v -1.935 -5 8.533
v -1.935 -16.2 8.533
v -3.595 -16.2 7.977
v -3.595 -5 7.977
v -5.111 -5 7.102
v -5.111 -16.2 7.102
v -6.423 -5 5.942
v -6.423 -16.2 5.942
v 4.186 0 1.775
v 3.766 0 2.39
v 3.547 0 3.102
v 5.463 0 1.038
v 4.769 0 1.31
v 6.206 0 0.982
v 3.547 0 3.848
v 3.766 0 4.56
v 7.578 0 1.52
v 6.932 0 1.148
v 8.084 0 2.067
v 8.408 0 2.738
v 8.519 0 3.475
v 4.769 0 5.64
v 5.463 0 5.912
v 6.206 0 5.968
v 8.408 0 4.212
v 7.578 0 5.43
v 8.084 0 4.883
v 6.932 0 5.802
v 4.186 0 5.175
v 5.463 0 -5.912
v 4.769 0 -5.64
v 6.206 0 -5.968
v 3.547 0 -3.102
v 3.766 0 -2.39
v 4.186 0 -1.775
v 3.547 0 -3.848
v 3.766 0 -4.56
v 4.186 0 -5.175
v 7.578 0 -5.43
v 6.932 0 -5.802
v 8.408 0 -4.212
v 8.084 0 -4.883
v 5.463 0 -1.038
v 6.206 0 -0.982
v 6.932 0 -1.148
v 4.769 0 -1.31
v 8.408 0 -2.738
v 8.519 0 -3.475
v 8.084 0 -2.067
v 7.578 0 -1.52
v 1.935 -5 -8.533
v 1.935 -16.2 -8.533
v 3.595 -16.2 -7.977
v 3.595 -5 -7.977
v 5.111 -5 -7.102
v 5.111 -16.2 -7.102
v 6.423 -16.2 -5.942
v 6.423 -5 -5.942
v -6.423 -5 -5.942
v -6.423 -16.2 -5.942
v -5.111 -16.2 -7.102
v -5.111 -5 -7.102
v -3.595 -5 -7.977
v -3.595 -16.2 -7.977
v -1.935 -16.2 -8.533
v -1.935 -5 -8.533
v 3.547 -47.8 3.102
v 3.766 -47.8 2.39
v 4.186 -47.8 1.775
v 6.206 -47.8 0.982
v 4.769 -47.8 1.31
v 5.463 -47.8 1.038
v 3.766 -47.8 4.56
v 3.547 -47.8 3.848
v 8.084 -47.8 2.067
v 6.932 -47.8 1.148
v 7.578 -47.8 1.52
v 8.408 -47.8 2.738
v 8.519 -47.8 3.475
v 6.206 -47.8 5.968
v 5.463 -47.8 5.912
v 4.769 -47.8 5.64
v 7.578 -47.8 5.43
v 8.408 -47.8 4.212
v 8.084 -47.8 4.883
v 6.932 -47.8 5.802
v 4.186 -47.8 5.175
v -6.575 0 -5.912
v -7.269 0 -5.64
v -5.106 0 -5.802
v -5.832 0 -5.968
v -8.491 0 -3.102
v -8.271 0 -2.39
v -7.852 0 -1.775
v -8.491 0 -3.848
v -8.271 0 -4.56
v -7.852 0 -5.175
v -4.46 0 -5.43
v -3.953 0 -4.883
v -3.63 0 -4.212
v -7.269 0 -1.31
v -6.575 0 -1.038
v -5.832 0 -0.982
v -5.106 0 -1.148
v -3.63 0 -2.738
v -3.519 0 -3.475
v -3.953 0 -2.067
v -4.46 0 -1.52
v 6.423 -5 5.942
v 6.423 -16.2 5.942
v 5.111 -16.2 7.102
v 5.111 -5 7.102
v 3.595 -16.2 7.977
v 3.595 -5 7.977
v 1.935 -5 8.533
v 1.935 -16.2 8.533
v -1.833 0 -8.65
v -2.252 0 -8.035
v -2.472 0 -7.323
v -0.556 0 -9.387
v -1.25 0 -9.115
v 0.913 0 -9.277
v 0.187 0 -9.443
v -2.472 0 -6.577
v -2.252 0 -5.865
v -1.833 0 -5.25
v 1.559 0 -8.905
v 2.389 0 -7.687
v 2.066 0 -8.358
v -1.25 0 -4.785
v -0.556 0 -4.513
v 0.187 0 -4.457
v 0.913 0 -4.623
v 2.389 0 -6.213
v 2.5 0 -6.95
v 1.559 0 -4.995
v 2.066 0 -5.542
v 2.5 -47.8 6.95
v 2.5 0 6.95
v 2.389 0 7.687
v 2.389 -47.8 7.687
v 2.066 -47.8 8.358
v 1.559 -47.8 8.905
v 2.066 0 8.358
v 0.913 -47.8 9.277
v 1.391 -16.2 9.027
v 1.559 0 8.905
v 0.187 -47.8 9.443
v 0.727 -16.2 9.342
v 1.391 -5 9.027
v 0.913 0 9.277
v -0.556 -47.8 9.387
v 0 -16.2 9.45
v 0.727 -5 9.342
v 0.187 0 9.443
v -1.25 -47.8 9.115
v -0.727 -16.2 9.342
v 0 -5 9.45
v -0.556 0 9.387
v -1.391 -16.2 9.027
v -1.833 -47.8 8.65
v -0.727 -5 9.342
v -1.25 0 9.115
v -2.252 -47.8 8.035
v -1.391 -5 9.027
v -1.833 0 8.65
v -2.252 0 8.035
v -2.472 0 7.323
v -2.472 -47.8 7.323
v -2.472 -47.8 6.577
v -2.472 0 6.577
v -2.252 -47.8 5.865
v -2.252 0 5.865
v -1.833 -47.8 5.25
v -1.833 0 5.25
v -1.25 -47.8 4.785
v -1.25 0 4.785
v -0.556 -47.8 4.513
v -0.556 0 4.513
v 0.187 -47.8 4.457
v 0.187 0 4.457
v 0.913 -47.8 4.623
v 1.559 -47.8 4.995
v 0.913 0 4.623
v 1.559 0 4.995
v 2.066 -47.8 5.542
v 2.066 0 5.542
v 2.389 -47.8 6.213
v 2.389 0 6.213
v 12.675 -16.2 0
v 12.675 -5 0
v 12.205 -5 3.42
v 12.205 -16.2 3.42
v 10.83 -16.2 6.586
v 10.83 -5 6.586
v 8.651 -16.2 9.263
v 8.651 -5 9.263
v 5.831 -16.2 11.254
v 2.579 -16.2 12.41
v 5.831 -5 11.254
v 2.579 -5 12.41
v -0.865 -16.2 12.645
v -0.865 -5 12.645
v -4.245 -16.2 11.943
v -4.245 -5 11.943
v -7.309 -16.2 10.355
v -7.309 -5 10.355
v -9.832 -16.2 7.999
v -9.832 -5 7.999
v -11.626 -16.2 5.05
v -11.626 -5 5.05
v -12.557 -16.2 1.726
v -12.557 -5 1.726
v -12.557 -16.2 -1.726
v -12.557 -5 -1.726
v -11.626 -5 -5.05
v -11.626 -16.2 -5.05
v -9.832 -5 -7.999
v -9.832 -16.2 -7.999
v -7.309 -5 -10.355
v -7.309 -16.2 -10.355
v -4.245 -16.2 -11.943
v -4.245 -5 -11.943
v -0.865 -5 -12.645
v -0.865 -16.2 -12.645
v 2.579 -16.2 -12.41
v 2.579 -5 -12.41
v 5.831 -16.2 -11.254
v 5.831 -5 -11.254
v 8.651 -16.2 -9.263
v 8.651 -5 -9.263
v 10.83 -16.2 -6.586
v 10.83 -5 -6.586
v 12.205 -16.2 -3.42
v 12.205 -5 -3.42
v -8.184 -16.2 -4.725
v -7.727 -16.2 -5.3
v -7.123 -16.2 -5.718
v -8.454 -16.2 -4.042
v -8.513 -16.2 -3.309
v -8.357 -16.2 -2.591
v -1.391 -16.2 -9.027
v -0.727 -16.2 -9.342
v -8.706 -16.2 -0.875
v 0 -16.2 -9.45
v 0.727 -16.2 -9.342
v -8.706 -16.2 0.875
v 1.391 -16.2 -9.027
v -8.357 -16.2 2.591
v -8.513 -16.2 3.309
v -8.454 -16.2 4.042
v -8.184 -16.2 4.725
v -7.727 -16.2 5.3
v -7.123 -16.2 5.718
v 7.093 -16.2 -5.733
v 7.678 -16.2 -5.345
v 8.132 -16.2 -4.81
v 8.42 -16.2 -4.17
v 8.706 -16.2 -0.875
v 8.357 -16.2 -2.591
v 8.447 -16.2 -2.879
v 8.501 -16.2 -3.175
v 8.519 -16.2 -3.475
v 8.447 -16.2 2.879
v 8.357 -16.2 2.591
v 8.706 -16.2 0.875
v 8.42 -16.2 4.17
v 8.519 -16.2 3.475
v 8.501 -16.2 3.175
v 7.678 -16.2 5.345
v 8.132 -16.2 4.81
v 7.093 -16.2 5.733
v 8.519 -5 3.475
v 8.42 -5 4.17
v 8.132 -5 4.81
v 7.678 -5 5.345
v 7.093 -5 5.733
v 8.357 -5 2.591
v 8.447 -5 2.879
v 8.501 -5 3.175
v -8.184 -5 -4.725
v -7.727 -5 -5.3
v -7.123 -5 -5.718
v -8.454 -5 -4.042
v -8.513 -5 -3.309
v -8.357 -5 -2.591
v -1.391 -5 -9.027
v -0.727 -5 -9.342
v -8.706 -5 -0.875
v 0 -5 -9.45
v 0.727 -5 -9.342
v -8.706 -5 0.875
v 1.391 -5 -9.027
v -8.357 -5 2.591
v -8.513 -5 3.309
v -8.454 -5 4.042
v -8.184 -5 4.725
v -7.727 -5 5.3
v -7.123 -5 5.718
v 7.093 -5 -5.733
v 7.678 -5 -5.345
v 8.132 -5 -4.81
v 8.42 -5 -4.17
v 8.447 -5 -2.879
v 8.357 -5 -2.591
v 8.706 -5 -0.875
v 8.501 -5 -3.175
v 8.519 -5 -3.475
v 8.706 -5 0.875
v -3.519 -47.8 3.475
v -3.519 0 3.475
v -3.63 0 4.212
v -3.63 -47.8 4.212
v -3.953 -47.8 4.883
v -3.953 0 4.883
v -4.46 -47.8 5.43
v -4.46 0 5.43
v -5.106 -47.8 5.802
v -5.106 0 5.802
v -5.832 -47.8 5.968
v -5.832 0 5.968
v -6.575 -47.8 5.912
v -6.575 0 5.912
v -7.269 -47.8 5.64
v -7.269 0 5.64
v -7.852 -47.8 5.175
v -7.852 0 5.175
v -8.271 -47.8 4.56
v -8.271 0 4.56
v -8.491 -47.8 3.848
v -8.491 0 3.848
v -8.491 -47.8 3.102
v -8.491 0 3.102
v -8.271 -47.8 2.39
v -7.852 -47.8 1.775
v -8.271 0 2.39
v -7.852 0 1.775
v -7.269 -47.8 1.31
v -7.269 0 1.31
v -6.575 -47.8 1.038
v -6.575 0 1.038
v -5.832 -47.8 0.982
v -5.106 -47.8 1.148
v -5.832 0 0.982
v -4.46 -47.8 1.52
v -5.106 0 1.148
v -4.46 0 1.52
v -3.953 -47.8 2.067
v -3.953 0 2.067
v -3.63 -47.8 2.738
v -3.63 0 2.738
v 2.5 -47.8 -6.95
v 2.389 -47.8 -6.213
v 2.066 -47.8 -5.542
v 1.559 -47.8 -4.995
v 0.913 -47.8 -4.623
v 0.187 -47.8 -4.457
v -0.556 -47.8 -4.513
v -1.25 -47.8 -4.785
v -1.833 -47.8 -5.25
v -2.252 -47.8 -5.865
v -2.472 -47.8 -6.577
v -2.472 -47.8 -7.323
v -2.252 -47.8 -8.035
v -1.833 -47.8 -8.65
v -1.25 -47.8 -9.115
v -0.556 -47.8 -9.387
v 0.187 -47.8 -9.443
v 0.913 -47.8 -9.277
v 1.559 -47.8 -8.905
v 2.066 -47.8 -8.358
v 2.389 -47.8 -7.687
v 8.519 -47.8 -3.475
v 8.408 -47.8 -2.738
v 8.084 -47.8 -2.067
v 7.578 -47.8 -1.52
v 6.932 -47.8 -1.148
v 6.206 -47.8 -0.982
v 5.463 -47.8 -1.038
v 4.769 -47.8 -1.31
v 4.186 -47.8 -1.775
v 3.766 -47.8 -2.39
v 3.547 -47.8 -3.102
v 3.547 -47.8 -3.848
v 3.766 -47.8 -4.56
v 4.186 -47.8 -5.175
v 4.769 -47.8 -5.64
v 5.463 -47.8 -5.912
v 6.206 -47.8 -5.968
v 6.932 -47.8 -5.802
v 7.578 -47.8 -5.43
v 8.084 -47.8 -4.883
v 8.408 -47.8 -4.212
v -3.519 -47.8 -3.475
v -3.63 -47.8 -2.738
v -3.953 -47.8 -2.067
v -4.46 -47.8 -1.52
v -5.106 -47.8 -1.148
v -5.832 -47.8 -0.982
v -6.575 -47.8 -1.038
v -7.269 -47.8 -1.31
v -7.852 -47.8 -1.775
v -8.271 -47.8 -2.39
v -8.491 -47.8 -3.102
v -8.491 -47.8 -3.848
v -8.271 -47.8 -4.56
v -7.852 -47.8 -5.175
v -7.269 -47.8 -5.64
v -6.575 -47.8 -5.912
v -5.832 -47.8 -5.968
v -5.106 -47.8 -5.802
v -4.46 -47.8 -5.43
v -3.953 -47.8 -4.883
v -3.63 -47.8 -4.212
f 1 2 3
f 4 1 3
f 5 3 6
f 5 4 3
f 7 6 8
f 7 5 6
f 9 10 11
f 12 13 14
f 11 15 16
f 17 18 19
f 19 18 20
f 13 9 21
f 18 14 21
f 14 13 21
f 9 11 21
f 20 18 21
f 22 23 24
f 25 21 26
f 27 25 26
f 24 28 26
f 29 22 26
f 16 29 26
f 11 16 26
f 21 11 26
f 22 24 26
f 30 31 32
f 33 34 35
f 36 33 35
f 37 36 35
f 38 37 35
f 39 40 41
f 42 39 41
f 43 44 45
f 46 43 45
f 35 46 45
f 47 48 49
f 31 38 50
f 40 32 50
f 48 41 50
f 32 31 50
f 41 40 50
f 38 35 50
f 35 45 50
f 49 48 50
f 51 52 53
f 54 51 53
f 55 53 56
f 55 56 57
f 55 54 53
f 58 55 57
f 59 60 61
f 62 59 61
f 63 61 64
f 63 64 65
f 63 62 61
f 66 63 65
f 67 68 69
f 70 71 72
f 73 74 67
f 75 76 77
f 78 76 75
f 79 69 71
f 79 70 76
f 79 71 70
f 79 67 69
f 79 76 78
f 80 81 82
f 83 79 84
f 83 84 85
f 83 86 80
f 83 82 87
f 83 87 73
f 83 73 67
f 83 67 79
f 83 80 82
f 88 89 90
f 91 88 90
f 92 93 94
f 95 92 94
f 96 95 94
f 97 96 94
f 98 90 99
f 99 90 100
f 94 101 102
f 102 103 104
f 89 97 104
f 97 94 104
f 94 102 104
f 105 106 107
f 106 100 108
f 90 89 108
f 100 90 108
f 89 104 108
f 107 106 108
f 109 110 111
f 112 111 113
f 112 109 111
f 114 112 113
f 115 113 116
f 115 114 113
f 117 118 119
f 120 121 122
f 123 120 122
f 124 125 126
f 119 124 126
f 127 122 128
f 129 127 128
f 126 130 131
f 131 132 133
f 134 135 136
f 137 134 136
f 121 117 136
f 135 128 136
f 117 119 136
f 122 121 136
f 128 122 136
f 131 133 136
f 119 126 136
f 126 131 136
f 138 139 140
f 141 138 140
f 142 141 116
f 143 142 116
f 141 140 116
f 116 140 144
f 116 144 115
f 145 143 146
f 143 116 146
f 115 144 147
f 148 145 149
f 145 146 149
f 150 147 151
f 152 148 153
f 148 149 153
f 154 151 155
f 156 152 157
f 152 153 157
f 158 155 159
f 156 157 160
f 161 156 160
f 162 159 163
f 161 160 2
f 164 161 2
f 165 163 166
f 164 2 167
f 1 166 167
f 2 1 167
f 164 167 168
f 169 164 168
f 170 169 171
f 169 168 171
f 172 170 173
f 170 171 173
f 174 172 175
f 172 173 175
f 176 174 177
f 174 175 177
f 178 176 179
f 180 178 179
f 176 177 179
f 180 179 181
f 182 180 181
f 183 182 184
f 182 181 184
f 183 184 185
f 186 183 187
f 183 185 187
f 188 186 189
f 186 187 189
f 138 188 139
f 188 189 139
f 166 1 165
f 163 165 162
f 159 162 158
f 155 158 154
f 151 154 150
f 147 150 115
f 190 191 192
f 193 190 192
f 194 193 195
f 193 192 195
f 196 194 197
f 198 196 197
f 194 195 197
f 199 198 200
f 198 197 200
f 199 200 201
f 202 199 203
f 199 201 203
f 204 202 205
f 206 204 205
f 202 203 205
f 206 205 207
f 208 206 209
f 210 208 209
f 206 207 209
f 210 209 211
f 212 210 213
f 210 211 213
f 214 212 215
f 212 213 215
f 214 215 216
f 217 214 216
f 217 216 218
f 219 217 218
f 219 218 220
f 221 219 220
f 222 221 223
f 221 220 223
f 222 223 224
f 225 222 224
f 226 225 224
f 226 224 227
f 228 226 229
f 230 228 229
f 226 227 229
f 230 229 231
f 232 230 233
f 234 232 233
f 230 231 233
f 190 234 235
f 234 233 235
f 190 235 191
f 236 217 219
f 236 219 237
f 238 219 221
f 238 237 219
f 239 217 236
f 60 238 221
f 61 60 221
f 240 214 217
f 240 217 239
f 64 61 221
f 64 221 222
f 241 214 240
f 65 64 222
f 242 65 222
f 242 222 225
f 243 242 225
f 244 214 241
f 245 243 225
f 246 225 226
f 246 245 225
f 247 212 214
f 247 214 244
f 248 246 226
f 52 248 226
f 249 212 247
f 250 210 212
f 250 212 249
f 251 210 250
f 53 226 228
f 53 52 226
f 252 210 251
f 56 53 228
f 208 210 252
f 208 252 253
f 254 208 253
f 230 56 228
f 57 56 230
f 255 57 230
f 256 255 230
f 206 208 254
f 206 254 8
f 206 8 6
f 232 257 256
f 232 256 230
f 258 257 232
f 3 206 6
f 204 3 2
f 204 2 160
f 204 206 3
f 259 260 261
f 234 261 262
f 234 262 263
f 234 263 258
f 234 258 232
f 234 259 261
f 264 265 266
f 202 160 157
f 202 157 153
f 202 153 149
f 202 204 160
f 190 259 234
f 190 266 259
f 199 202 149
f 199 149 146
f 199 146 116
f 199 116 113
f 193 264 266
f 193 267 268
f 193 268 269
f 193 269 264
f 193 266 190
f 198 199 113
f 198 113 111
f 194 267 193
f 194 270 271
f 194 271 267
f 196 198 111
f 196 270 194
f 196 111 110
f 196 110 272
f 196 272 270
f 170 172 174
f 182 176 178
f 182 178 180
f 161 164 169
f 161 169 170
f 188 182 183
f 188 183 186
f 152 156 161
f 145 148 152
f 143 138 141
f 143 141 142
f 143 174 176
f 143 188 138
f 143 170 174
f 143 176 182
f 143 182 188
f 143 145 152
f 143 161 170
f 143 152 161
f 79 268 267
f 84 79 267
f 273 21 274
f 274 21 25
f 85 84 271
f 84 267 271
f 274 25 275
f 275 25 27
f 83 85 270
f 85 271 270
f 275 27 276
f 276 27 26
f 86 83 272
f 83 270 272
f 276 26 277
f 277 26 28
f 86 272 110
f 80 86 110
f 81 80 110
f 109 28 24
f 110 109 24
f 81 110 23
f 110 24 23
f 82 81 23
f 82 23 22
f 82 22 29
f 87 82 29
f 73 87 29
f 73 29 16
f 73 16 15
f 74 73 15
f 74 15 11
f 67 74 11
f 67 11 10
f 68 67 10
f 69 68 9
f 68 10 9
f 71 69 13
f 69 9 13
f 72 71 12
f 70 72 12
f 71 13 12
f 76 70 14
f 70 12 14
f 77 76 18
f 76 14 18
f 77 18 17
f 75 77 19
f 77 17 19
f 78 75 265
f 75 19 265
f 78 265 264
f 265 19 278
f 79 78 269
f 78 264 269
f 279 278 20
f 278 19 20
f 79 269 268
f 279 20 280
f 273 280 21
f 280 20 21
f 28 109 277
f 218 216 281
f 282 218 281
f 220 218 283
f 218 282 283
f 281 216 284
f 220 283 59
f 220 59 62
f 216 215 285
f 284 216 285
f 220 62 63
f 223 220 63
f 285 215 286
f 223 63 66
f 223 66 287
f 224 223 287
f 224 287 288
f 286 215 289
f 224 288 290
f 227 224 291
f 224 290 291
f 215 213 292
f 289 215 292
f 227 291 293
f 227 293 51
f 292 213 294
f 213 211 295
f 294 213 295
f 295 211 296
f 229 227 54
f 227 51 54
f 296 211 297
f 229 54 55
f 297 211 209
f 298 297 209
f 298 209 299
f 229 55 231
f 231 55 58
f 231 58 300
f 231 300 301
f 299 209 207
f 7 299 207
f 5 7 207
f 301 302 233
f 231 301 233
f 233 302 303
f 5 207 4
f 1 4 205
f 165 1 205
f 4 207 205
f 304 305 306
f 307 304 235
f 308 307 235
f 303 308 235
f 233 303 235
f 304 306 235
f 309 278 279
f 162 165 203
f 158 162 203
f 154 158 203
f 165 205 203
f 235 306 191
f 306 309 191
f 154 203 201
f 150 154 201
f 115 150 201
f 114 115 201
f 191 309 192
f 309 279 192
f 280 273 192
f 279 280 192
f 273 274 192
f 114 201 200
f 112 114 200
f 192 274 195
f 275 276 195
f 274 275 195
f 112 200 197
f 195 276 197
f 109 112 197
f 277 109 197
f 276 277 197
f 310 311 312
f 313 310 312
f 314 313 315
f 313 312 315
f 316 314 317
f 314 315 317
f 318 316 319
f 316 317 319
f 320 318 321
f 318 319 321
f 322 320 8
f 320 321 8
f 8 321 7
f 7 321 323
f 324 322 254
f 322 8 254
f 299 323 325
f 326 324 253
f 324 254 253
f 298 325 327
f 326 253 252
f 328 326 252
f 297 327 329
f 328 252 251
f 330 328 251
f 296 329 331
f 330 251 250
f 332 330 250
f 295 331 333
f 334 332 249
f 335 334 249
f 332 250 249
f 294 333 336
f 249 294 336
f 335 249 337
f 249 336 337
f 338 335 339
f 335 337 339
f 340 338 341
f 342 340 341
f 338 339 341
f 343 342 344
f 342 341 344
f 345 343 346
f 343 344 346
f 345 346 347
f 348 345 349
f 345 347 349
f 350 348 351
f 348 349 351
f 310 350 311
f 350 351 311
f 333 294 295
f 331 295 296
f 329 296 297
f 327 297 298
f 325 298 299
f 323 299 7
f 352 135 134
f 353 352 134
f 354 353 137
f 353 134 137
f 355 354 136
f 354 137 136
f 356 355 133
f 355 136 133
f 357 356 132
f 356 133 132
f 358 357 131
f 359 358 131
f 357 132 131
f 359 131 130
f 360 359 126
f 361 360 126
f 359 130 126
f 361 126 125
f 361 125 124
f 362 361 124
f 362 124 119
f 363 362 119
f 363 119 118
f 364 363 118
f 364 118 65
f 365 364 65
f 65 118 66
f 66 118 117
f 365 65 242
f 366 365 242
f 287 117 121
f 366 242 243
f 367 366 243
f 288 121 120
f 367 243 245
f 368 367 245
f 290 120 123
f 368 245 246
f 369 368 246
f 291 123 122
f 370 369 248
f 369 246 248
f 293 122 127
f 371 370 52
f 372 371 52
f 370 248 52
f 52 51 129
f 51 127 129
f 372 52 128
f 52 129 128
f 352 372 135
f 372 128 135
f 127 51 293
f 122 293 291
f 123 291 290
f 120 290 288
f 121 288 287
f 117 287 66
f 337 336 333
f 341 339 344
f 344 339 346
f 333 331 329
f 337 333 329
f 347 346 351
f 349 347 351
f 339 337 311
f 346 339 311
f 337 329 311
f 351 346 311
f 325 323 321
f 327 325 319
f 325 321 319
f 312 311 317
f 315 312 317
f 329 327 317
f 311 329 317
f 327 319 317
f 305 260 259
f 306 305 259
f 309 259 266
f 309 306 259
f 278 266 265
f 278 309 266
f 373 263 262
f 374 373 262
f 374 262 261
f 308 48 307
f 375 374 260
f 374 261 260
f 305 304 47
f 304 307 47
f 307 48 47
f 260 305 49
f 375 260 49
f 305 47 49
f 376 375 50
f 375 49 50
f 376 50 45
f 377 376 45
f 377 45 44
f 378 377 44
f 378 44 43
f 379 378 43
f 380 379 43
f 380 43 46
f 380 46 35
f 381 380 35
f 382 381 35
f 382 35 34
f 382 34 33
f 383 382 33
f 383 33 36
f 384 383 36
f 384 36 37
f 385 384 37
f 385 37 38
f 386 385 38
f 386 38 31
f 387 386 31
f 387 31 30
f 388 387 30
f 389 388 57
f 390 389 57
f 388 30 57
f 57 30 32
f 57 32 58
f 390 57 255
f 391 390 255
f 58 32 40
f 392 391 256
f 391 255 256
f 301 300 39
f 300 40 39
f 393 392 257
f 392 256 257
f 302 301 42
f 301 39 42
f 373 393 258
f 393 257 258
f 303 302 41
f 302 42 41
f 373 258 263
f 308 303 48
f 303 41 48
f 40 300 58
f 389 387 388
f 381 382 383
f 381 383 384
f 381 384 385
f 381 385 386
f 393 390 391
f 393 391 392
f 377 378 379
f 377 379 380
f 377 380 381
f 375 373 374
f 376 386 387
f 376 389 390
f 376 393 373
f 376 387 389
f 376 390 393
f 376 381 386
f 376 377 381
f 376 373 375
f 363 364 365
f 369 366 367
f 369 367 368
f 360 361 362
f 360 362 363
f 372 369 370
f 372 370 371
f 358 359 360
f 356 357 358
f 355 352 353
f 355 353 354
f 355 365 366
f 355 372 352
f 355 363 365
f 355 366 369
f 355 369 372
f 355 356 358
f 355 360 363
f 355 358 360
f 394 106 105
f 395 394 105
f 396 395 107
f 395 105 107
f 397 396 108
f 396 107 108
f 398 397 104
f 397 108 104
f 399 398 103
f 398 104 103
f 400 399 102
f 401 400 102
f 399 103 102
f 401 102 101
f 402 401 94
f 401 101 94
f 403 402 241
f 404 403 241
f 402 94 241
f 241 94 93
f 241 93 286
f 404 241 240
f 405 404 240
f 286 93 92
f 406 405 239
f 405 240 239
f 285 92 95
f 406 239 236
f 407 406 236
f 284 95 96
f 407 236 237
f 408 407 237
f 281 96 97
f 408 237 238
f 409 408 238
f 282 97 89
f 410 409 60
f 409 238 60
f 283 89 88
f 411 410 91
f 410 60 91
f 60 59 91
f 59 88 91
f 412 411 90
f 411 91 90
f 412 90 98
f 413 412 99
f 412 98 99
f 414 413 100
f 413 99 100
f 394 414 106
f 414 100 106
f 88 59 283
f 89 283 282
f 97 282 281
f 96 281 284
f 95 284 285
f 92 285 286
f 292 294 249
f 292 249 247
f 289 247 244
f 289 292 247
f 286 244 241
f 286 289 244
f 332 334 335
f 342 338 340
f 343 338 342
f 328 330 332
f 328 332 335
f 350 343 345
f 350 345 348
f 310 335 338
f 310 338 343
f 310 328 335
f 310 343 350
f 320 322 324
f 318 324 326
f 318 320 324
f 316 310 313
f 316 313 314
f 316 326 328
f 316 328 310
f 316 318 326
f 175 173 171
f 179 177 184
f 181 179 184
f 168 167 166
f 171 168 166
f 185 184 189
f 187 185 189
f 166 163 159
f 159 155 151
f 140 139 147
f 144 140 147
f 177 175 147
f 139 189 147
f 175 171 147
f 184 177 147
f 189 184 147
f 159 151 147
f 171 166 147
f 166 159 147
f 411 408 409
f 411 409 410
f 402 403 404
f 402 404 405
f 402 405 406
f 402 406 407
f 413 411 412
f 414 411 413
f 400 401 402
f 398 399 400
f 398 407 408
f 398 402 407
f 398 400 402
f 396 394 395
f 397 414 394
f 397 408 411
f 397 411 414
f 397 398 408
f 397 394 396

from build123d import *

# Parameters (mm, degrees)
F0_R     = 2.5
F1_DEPTH = 47.8
F3_R     = 12.675
F3_R_2   = 8.75
F4_DEPTH = 11.2


with BuildPart() as f1:
    # F0 (on Front) → F1 (new body)
    with BuildSketch(Plane.XZ):
        with Locations((0, 6.95)):
            Circle(F0_R)
        with Locations((-6.018877, 3.475)):
            Circle(F0_R)
        with Locations((-6.018877, -3.475)):
            Circle(F0_R)
        with Locations((0, -6.95)):
            Circle(F0_R)
        with Locations((6.018877, -3.475)):
            Circle(F0_R)
        with Locations((6.018877, 3.475)):
            Circle(F0_R)
    extrude(amount=F1_DEPTH)

    # F3 (on offset) → F4 (join)
    with BuildSketch(Plane.XZ.offset(5)):
        Circle(F3_R)
        Circle(F3_R_2, mode=Mode.SUBTRACT)
    extrude(amount=F4_DEPTH)


solid = f1.part
